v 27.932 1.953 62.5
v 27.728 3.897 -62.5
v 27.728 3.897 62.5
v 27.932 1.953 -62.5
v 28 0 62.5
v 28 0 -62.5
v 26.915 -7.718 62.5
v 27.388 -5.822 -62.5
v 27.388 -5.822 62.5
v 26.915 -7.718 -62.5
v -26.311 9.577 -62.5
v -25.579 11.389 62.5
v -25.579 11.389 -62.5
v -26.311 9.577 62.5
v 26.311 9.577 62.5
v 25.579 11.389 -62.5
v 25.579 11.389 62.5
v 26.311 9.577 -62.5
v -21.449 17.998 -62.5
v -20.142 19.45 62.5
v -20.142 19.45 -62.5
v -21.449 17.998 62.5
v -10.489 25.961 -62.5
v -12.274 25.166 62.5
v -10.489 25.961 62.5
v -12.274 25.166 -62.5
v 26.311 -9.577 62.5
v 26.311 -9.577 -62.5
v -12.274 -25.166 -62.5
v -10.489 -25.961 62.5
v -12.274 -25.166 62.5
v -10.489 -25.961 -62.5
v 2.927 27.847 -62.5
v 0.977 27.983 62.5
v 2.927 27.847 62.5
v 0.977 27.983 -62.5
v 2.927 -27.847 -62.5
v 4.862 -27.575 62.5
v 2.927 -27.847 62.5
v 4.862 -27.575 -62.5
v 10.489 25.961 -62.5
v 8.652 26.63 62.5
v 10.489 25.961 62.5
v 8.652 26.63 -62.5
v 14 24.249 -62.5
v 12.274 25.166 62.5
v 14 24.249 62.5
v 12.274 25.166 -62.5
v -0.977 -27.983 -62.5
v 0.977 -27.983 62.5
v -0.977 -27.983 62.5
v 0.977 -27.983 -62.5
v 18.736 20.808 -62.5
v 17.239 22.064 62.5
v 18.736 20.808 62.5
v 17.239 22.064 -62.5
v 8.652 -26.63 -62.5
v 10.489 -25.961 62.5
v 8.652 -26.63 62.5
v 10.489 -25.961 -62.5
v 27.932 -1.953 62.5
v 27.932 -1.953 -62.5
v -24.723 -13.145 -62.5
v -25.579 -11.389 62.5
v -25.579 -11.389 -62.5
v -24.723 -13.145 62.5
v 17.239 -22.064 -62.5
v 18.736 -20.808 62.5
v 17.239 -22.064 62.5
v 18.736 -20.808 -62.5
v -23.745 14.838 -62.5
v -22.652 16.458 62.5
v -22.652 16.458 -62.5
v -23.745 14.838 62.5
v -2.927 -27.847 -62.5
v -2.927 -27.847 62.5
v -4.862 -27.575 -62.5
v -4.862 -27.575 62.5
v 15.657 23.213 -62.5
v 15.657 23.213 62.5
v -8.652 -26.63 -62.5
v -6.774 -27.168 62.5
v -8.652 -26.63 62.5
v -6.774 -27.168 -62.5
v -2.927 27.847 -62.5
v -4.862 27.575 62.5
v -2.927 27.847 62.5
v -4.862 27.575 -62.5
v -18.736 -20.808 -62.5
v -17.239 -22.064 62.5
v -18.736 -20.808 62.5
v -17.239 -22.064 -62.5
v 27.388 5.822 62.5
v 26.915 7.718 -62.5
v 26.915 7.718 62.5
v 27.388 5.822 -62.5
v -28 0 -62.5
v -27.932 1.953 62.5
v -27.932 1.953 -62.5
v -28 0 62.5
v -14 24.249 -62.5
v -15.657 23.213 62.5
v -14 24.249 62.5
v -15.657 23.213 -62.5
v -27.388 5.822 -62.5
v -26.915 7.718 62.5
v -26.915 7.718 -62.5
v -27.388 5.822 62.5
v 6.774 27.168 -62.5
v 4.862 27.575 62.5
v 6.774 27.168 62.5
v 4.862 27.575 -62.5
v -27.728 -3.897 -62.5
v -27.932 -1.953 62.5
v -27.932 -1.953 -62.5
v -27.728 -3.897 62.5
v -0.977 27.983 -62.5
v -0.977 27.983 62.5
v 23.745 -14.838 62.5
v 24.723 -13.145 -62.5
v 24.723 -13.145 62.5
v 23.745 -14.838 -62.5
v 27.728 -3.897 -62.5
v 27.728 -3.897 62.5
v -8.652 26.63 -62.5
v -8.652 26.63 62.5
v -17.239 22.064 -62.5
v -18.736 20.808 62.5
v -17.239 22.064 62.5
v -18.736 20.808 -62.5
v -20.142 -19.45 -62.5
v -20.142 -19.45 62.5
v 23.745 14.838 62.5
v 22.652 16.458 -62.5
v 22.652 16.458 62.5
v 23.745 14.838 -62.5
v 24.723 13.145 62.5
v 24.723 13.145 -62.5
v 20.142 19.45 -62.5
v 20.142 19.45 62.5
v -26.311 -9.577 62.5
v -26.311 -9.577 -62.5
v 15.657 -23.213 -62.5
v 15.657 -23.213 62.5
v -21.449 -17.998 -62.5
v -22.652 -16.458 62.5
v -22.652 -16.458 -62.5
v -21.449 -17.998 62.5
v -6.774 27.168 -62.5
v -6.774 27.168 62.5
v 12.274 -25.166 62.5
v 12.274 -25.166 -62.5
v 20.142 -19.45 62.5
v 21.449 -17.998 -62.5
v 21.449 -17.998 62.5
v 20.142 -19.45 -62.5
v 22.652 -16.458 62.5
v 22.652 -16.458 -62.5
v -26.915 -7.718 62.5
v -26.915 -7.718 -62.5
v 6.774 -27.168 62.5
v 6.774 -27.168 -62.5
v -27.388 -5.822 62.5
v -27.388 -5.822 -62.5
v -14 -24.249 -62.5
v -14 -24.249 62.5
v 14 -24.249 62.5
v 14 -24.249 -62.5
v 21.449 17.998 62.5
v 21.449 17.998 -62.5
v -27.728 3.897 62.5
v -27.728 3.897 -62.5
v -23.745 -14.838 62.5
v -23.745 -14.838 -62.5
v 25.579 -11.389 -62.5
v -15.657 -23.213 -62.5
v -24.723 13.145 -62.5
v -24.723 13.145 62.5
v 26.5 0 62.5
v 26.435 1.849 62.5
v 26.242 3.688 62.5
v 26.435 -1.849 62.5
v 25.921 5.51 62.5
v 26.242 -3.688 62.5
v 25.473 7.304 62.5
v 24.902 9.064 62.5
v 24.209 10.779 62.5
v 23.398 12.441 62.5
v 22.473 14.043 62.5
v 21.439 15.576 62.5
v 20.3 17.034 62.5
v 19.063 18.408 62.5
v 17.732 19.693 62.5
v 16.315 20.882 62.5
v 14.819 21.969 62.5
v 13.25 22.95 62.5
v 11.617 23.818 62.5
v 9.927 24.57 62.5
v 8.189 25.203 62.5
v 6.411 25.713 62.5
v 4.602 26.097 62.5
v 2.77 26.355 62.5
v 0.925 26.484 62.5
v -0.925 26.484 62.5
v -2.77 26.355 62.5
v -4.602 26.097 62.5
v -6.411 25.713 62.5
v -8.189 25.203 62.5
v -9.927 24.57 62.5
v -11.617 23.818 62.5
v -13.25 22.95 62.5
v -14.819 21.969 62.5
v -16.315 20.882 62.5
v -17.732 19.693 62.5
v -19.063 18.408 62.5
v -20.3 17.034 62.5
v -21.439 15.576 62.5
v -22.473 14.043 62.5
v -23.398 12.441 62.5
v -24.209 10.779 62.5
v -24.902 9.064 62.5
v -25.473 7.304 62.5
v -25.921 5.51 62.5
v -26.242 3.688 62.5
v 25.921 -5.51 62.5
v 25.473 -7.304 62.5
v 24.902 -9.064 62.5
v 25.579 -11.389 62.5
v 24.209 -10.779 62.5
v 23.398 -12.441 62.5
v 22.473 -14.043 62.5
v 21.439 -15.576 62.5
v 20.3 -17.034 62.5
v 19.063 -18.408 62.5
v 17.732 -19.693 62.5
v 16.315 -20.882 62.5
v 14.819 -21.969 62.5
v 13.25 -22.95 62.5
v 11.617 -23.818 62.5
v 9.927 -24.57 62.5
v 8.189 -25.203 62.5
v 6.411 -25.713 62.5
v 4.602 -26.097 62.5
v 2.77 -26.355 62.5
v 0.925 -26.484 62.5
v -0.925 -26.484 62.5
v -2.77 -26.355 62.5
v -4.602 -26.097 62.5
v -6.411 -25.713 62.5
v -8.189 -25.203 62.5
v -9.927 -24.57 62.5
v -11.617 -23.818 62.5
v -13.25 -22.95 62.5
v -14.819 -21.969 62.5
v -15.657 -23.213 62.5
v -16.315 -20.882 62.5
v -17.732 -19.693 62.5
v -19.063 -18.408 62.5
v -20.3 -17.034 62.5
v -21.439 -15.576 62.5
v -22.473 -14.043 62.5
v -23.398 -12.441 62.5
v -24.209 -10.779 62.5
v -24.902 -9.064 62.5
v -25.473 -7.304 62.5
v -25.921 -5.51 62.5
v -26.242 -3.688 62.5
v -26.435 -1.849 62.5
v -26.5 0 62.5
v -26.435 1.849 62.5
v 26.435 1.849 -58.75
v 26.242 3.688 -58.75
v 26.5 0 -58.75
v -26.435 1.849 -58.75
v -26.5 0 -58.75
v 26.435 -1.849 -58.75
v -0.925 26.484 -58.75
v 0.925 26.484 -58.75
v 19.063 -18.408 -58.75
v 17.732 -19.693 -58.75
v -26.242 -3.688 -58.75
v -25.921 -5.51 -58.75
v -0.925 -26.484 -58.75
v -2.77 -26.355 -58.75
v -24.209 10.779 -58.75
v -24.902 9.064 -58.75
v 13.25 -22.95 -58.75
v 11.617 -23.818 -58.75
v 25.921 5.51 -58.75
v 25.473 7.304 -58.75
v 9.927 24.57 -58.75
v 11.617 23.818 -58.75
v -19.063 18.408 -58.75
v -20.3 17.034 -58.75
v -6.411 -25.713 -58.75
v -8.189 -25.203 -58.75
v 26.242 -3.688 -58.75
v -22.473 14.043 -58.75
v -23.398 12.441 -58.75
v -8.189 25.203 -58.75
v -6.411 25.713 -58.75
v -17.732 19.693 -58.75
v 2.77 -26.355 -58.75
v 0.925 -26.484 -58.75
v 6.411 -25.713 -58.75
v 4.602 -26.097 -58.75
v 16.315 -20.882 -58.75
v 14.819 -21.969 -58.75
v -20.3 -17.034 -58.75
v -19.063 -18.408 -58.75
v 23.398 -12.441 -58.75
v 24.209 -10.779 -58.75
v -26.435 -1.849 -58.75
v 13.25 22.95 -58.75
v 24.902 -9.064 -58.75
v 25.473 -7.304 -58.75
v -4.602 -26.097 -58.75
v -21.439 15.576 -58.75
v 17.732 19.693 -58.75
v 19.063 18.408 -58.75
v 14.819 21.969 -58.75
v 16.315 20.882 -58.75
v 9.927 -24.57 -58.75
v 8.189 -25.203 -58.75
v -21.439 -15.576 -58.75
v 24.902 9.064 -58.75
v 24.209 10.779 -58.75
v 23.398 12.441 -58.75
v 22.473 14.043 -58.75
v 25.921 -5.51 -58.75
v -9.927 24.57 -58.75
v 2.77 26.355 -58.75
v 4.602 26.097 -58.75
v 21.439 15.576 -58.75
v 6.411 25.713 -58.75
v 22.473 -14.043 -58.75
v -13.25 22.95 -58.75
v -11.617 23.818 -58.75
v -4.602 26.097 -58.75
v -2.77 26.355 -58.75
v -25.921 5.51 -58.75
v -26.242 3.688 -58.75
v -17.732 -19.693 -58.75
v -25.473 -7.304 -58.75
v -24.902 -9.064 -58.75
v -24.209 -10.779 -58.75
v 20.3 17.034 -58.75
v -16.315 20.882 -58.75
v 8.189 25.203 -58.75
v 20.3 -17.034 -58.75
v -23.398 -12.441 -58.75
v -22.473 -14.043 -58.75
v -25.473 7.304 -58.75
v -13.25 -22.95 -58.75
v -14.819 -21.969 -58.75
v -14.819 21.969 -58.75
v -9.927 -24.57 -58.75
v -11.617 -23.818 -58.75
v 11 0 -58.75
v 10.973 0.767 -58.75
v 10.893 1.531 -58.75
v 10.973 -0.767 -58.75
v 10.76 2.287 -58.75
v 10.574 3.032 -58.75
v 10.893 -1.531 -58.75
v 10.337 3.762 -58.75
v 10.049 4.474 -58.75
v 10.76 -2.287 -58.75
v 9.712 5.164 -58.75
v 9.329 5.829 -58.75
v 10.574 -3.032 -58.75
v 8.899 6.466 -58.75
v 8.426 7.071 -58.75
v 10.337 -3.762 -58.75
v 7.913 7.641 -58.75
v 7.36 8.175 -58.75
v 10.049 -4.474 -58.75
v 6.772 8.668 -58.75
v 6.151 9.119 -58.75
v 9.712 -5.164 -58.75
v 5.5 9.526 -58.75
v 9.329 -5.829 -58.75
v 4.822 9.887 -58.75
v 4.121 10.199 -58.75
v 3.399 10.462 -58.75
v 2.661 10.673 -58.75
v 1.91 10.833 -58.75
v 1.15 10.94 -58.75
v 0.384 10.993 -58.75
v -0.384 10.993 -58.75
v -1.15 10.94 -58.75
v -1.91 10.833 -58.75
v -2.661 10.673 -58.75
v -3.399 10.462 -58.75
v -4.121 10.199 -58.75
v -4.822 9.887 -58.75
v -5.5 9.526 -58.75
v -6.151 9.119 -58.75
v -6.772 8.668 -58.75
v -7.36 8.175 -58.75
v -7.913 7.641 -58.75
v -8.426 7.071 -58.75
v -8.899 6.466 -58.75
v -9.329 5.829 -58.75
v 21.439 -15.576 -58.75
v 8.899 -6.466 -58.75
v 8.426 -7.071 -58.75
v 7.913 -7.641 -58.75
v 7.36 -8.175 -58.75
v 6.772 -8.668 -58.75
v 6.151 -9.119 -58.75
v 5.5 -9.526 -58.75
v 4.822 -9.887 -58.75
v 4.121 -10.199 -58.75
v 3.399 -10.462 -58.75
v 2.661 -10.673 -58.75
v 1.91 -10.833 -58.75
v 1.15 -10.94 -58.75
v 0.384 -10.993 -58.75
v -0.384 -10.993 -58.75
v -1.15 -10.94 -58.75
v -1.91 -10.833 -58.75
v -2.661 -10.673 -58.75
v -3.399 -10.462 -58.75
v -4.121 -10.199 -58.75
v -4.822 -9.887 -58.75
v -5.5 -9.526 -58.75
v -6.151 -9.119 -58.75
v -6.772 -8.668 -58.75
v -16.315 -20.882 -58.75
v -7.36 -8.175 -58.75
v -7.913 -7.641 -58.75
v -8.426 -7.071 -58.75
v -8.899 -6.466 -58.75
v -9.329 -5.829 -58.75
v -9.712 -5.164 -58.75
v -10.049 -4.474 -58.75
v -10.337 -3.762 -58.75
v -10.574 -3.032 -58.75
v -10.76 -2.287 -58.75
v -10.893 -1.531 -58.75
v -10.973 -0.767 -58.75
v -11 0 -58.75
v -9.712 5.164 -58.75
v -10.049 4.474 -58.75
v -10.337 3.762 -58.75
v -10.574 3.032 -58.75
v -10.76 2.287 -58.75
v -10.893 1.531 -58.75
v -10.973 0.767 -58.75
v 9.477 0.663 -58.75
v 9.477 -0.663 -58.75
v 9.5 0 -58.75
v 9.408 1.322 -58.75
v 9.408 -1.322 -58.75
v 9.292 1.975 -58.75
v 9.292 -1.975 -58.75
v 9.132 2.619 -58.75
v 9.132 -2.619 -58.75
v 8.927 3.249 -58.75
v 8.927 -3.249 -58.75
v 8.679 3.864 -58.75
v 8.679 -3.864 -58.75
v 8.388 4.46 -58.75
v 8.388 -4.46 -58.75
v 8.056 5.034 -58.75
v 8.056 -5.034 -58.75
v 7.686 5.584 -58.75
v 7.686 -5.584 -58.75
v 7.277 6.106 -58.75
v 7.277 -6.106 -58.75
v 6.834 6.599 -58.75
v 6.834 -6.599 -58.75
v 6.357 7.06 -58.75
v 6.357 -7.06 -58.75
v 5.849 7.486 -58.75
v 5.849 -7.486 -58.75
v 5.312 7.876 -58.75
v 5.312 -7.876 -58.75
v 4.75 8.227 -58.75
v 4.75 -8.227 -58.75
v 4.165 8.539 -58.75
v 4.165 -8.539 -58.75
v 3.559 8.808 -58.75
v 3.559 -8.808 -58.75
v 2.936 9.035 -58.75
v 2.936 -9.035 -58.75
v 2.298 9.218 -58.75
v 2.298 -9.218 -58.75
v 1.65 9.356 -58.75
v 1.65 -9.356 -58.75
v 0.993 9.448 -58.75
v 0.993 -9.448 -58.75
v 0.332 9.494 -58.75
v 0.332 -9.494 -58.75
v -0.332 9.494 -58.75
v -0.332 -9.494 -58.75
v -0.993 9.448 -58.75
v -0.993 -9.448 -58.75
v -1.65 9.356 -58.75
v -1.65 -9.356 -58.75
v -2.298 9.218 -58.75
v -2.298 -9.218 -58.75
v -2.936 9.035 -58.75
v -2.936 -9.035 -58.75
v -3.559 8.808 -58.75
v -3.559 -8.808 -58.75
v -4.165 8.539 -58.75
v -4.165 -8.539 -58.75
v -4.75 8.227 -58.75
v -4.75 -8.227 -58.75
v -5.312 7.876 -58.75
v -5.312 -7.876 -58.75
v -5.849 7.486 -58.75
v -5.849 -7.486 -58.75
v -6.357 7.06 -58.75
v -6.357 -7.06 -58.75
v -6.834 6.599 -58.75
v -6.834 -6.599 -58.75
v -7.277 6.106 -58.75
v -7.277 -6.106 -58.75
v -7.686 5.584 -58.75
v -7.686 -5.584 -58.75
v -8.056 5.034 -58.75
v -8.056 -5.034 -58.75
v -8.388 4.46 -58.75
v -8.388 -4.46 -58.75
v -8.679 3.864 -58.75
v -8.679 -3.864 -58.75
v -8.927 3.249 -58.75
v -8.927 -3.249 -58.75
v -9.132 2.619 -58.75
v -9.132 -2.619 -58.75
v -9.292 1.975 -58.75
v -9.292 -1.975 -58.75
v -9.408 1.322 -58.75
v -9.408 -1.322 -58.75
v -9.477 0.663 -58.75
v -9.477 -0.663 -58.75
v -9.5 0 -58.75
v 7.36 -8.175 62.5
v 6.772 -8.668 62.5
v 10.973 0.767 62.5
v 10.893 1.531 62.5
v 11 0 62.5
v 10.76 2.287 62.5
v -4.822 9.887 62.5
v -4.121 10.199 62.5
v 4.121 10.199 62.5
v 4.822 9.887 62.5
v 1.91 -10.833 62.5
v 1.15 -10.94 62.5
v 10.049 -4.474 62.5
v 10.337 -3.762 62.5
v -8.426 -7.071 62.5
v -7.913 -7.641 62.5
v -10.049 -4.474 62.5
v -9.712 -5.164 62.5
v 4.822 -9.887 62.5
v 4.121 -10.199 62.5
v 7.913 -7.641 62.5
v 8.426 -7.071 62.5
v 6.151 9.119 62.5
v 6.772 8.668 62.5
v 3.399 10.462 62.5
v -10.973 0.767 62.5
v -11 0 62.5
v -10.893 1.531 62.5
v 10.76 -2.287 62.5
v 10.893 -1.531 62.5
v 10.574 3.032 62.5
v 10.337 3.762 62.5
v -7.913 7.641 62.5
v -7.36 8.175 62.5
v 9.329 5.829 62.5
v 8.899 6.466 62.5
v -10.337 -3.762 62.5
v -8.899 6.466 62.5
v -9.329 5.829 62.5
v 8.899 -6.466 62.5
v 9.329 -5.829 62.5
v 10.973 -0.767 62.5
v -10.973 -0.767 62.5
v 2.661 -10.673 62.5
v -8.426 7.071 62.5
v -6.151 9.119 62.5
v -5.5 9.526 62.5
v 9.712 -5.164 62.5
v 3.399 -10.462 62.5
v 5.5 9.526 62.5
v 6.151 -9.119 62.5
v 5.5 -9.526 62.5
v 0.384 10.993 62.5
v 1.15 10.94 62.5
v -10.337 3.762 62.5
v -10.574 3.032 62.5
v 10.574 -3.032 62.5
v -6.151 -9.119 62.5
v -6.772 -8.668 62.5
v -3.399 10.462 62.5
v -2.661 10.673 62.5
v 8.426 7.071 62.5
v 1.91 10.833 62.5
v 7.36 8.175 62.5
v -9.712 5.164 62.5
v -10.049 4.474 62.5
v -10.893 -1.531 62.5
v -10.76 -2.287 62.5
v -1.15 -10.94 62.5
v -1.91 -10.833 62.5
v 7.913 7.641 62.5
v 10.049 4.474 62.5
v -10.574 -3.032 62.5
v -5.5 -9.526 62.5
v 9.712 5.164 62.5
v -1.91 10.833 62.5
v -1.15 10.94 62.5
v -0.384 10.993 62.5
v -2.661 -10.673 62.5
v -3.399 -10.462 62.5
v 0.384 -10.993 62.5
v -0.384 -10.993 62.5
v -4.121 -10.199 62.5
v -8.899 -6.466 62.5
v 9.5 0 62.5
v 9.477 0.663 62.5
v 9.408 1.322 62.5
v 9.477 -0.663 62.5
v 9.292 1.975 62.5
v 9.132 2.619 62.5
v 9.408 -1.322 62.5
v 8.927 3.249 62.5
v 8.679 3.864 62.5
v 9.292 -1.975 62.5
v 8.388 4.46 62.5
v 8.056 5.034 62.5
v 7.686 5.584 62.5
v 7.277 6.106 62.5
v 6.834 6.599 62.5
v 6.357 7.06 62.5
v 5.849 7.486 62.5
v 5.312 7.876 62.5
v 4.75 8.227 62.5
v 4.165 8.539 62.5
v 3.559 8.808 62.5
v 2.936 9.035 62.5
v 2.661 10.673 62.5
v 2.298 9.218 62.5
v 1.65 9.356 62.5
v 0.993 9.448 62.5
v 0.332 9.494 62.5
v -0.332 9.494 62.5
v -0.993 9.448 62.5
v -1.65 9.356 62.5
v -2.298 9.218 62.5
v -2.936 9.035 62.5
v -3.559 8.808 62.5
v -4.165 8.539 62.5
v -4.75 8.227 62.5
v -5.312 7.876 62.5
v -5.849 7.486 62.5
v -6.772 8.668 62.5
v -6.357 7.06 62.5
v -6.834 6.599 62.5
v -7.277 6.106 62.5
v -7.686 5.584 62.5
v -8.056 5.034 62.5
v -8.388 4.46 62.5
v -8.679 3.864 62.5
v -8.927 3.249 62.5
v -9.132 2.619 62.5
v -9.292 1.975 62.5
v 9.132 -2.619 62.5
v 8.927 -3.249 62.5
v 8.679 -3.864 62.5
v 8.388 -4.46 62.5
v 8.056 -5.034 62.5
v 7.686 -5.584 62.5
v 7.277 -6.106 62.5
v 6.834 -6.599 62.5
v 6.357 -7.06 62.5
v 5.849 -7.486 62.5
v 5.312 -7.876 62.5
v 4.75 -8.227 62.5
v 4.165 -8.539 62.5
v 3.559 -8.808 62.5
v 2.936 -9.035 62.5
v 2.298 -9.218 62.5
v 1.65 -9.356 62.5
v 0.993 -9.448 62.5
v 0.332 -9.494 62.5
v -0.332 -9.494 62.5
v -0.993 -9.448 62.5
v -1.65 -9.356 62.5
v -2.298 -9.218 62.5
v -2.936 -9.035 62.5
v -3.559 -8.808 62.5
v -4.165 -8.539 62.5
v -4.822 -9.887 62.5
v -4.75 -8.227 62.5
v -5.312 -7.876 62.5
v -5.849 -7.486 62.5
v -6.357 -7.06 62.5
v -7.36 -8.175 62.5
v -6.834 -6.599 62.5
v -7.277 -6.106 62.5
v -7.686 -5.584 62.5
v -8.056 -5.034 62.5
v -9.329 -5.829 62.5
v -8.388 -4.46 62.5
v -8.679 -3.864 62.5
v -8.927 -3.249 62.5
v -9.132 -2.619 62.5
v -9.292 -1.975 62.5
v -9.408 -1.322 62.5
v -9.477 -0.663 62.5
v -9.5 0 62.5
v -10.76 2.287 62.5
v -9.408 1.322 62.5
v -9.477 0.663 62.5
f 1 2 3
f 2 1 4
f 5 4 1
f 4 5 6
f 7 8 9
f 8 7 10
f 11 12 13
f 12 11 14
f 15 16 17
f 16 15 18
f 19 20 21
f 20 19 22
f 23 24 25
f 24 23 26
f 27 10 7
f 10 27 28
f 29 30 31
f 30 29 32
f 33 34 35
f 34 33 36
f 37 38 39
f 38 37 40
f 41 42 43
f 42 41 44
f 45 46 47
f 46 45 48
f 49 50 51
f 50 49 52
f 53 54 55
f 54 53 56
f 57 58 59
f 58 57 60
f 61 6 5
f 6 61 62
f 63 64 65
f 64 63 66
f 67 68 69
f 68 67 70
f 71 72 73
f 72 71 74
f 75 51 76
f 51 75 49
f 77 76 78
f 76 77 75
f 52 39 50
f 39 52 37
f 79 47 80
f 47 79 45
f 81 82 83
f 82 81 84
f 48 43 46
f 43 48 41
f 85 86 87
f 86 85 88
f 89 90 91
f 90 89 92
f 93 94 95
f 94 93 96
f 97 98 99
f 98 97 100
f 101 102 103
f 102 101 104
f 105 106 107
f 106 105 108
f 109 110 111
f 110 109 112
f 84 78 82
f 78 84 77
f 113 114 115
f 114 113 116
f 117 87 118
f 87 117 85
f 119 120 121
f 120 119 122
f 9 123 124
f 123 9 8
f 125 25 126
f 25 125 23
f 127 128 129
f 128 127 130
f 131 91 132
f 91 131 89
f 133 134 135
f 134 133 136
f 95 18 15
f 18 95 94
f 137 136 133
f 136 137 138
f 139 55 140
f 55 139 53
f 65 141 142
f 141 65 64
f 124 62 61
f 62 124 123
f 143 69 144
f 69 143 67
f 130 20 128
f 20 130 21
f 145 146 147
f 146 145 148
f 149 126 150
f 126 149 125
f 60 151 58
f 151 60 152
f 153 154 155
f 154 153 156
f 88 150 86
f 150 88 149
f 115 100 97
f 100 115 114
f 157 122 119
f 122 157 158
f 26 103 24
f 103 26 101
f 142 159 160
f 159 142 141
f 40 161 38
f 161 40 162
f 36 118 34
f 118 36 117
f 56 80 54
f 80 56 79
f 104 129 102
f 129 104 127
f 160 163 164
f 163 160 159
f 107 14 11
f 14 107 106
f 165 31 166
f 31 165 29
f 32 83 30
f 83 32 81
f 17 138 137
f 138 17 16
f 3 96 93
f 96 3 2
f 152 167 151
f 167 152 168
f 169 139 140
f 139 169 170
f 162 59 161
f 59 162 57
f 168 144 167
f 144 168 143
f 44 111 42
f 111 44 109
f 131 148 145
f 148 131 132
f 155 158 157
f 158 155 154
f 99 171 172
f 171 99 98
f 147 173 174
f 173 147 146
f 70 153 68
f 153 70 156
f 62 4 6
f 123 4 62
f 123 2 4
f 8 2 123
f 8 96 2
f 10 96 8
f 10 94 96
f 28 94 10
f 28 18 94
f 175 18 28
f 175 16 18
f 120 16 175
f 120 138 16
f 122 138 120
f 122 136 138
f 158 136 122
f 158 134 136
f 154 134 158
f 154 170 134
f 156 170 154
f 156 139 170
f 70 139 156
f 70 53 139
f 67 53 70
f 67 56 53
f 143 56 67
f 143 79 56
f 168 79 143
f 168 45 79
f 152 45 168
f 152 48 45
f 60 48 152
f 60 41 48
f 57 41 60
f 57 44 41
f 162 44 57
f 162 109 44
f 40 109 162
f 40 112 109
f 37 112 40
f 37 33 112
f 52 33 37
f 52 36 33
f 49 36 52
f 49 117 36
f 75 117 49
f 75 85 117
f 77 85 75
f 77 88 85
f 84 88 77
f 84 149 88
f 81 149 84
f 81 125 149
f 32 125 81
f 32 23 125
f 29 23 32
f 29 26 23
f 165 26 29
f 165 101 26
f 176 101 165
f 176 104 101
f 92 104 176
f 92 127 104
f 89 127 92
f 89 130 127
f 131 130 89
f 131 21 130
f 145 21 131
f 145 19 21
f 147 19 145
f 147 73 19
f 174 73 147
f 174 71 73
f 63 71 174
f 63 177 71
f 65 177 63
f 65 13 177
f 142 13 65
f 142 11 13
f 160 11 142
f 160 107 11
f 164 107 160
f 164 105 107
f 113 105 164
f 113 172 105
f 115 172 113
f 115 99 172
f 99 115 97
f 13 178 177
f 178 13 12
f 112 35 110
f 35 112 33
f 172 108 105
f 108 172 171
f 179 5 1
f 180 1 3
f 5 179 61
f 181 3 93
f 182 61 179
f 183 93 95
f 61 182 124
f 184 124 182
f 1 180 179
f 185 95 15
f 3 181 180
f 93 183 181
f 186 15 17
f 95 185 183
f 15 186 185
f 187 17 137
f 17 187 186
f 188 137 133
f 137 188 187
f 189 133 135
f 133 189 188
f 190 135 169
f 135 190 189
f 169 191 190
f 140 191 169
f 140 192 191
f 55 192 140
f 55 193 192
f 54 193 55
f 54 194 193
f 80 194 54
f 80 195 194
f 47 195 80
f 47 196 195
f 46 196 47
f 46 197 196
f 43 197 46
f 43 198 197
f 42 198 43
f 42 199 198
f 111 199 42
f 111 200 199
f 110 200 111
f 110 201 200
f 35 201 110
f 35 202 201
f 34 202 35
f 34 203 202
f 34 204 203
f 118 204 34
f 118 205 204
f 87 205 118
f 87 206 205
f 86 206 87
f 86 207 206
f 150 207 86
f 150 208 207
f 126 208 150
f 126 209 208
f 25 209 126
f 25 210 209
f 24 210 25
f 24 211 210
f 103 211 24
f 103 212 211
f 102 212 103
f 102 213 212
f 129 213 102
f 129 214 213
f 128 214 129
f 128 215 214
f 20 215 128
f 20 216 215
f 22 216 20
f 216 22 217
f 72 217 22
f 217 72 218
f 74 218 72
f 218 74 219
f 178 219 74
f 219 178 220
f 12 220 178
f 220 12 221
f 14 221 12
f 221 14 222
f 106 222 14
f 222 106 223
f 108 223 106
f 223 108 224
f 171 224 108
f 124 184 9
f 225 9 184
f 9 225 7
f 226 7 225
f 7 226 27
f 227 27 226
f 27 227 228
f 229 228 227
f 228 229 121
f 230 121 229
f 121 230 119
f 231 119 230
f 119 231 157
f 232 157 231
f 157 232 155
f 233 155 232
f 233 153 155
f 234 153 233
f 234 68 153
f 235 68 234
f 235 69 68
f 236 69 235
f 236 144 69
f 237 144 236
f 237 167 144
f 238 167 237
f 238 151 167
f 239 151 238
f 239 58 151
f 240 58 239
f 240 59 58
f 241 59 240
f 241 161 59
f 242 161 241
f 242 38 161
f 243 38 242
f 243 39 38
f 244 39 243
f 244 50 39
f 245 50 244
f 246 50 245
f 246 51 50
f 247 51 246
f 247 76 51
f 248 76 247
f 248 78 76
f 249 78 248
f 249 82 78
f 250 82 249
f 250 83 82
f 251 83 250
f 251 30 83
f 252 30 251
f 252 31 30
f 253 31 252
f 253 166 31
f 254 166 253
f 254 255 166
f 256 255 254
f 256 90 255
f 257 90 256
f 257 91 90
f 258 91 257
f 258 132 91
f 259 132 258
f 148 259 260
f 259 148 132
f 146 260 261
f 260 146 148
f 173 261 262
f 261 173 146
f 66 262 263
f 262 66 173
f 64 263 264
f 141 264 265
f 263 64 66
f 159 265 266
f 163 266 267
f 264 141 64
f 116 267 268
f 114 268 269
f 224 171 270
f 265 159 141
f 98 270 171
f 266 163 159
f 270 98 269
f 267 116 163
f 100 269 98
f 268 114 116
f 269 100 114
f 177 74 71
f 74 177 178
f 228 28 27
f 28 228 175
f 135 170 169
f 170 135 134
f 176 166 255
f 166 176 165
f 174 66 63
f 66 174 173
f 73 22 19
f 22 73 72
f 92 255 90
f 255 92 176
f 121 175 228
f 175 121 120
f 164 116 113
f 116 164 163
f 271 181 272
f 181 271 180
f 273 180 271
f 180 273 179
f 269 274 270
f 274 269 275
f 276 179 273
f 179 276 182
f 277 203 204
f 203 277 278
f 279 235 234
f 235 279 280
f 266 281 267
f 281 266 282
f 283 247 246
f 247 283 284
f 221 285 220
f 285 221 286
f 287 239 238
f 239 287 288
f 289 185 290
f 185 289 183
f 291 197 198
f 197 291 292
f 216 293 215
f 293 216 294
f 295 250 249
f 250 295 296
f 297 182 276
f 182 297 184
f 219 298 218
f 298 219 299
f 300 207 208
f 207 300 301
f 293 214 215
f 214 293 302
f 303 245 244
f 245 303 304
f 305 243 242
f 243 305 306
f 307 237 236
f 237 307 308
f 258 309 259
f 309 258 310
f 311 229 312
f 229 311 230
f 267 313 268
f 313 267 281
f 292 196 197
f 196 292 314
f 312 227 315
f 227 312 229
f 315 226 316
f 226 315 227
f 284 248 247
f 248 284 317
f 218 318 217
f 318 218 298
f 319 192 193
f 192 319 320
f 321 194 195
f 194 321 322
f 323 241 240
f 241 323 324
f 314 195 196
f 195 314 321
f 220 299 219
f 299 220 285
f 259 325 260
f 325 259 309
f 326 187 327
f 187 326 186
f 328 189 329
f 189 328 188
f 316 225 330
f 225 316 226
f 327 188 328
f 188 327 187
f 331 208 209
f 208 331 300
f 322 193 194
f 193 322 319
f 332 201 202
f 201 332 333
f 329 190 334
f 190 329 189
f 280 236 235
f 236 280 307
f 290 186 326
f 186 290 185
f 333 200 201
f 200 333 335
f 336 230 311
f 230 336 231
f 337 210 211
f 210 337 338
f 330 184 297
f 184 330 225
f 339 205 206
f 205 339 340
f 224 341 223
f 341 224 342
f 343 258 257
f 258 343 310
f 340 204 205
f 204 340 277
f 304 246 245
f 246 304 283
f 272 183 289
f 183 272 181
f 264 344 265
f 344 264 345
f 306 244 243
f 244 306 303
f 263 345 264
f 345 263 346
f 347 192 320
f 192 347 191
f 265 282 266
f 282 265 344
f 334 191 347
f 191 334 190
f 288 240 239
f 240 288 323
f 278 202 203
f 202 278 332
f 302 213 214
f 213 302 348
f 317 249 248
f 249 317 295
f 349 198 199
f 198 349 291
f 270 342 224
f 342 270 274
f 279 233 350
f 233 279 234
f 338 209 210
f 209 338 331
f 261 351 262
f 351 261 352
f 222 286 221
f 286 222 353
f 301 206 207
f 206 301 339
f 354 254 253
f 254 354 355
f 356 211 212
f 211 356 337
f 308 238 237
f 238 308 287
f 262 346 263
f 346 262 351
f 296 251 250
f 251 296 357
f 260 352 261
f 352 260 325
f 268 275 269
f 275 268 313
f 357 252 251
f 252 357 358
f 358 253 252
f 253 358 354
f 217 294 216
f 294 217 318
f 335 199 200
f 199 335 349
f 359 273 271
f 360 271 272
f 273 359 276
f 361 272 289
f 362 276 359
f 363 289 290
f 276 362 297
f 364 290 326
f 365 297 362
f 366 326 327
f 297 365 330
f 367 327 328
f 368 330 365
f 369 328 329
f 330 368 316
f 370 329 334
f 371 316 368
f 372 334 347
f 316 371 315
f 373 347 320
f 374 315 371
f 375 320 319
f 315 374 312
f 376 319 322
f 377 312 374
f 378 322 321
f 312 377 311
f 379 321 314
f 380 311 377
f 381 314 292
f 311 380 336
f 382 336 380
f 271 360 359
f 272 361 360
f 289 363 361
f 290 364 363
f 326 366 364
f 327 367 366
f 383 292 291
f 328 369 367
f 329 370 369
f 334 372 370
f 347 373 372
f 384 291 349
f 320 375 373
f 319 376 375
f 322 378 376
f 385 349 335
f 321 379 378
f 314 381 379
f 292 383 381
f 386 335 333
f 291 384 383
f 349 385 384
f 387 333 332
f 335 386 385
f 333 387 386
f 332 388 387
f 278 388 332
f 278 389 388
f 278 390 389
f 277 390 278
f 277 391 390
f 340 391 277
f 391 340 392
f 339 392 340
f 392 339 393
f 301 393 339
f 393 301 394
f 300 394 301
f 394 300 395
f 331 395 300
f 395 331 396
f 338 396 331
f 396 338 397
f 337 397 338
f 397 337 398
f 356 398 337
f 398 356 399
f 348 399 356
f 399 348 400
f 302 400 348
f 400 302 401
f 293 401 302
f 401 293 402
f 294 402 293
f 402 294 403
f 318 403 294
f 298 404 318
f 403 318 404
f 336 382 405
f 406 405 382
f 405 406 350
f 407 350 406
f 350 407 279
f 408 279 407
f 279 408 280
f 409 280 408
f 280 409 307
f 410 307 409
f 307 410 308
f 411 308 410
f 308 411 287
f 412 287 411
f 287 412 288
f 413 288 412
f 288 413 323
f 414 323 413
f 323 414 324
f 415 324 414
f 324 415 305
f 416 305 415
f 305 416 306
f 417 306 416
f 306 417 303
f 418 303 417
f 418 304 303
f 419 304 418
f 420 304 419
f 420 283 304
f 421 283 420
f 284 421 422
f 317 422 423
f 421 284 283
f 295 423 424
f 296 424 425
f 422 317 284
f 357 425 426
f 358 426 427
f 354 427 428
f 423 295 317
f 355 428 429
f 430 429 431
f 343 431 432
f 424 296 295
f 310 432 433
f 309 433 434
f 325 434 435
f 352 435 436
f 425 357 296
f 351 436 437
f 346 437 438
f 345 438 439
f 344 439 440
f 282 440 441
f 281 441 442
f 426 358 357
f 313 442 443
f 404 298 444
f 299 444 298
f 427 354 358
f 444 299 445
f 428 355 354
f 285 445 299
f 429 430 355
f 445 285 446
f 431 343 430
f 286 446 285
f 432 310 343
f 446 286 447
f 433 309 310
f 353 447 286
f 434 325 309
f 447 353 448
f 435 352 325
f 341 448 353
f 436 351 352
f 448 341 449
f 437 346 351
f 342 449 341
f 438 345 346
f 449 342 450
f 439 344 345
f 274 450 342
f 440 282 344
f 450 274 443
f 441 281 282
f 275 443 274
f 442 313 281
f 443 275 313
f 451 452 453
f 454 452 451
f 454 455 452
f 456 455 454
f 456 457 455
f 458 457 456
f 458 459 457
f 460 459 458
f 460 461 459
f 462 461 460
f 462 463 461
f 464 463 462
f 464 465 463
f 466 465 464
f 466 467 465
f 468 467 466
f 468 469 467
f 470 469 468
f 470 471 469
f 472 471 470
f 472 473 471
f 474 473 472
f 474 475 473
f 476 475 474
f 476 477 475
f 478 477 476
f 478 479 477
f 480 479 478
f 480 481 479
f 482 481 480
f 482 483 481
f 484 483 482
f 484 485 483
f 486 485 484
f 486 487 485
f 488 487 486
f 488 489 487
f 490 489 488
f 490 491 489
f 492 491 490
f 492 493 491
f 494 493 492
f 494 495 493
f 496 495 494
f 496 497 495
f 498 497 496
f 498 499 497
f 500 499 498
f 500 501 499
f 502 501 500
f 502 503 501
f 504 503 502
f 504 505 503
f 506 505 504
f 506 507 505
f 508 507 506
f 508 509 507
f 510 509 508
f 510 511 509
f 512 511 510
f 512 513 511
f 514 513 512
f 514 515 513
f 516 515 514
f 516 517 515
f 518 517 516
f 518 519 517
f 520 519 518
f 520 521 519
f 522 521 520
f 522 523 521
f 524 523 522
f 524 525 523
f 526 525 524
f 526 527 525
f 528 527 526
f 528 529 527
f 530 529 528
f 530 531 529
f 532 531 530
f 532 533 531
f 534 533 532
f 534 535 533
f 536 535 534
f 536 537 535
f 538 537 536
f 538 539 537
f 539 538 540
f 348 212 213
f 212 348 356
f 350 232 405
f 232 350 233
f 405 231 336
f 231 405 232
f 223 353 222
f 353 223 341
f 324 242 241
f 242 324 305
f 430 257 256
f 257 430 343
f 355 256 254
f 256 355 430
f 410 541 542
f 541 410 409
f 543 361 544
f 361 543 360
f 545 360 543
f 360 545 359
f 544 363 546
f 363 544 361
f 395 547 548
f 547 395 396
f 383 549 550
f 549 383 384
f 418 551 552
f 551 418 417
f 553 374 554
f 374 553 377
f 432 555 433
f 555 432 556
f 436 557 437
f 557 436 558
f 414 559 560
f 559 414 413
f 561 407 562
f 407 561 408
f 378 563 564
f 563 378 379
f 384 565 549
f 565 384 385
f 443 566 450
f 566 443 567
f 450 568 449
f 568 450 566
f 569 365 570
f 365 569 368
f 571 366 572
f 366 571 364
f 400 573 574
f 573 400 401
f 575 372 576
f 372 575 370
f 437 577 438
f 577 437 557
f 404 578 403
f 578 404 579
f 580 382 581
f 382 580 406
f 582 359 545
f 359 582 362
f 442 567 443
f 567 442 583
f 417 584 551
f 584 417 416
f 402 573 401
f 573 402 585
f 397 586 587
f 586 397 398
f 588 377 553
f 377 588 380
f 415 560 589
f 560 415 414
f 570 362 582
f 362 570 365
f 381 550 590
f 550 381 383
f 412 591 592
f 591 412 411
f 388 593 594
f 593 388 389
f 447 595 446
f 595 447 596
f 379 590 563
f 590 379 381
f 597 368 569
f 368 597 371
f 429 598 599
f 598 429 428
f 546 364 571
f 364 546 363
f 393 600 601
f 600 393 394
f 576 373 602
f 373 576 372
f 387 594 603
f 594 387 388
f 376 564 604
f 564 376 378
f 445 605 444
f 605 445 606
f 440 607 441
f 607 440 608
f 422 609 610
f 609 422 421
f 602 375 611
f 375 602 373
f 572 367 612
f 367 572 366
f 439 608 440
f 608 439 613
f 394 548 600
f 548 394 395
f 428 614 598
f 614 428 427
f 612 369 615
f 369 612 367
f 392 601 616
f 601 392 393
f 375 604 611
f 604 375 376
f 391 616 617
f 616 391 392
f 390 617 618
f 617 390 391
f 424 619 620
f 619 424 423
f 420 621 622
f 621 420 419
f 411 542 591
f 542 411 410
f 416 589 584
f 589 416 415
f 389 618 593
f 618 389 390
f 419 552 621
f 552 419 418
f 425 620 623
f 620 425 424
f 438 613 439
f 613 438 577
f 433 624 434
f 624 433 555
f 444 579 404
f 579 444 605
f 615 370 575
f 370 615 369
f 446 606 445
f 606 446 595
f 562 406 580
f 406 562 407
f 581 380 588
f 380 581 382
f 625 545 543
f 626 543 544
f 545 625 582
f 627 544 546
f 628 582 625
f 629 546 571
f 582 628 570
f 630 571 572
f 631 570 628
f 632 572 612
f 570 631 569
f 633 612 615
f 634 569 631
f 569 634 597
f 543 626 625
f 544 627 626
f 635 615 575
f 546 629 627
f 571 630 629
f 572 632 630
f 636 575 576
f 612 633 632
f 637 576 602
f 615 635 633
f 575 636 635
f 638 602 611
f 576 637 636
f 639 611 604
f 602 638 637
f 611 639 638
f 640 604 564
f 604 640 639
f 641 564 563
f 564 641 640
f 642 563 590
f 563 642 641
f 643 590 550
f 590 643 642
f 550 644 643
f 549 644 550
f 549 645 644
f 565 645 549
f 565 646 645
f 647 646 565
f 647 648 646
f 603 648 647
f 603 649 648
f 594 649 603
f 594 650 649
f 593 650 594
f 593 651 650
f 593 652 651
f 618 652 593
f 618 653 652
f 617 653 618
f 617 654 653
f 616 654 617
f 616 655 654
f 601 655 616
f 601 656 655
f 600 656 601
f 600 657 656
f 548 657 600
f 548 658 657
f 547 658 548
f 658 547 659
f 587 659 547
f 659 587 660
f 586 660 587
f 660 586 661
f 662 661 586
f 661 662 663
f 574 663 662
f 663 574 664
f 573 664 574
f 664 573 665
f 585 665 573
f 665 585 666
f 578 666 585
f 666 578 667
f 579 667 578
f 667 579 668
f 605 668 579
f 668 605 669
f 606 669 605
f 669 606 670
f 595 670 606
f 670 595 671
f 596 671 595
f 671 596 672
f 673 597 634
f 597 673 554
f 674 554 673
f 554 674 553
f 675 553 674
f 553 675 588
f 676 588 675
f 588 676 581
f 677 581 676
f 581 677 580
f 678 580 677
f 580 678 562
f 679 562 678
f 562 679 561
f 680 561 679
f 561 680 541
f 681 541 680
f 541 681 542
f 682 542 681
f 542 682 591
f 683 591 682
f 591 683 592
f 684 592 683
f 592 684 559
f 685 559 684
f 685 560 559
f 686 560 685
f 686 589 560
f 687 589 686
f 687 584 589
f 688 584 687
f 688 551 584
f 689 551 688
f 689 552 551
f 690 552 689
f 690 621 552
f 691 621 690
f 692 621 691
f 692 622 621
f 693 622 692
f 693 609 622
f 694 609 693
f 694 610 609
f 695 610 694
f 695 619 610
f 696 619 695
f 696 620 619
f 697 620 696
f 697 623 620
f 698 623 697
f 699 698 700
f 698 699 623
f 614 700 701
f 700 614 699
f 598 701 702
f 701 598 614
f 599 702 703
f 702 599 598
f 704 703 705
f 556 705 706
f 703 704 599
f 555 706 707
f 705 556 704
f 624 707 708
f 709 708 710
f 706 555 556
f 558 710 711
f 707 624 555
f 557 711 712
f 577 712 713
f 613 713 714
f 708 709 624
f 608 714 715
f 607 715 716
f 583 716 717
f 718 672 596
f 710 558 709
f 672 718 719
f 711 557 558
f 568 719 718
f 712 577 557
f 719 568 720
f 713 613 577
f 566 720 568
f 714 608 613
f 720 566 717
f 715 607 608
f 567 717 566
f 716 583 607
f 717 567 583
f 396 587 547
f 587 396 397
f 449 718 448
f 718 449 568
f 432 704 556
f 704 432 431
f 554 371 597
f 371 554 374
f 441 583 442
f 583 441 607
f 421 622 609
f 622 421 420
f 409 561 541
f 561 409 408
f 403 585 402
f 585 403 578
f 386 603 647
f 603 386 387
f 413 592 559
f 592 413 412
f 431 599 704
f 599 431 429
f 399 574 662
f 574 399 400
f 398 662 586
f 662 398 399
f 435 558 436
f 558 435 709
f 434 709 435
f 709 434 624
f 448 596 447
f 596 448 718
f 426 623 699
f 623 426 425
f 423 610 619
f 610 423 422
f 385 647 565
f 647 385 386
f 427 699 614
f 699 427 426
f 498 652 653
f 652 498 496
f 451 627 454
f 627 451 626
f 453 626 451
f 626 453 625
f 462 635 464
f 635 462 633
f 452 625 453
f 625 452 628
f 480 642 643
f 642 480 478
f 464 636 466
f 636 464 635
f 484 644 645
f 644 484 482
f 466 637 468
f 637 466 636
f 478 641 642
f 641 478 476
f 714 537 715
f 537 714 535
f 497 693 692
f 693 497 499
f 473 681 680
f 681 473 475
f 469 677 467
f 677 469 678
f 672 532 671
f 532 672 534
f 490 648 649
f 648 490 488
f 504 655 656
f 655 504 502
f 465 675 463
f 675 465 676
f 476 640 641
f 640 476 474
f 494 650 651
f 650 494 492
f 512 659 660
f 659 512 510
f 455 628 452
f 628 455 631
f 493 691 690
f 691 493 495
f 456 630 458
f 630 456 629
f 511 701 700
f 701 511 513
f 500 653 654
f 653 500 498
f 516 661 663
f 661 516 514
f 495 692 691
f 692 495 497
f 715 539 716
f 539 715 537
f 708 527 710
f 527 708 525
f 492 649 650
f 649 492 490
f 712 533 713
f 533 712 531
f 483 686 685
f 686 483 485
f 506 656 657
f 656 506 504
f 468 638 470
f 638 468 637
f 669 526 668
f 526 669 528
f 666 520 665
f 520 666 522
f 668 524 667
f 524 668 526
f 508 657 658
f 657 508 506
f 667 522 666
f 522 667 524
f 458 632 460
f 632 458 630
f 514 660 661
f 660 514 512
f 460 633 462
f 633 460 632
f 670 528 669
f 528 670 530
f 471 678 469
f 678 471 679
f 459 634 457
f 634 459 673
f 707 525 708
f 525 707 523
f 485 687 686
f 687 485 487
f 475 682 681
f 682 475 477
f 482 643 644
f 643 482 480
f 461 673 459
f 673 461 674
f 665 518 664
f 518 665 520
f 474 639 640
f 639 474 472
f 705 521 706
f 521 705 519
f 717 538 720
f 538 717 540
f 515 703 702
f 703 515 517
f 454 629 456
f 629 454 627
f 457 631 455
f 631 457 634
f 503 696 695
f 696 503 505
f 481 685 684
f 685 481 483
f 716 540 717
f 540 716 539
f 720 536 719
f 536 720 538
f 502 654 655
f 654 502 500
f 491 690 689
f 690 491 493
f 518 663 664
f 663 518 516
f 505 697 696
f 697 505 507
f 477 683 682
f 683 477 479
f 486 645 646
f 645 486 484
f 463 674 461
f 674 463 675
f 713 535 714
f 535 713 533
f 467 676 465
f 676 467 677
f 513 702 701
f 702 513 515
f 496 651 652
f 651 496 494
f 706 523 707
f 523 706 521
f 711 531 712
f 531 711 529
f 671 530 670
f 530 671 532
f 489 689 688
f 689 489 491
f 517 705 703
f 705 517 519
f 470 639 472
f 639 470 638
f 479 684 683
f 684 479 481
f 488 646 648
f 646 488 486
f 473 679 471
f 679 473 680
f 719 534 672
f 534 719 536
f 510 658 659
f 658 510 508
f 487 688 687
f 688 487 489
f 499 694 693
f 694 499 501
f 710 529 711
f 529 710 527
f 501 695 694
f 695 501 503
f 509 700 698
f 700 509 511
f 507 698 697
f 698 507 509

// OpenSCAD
// file: ../_lib_/cap3d.scad
module cap3d(outer_radius=20, height=10, walls_thickness=2, top_thickness=-1){
    /* module for round lid cap*/
    top_thickness = top_thickness <0 ? walls_thickness : top_thickness;
    r_outer = outer_radius;
    h_outer = height;
    r_inner = outer_radius - walls_thickness;
    h_inner = height - top_thickness;
    inner_z_offset = top_thickness;
    
    difference(){
        color("blue")cylinder(h=h_outer ,r=r_outer ,center=true); //outer
        translate([0,0,top_thickness]) color("red")cylinder(h=h_inner ,r=r_inner ,center=true); //inner
        }//difference
    } //module
    
  $fn=90;
//  cap3d(top_thickness=0);
// file: ../_lib_/straight_pipe3d.scad
module straight_pipe3d(r_inner=4, r_outer=6, length=10){

        difference(){
            color("blue")cylinder(h=length ,r=r_outer ,center=true); //outer
            color("red") cylinder(h=length ,r=r_inner ,center=true); //inner
        }//difference

    }//module
    
/*
$fn=60;
translate([0,0,-3]) straight_pipe3d();
translate([0,3,0]) rotate([90,0,0]) straight_pipe3d();
    */
// main file
include <../_lib_/straight_pipe3d.scad>
include <../_lib_/cap3d.scad>


cap3d(outer_radius=28, height=125, walls_thickness=1.5, top_thickness=2.5);
straight_pipe3d(r_inner=9.5, r_outer=11, length=125);


//cap3d(outer_radius=29.0, height=8, walls_thickness=0.8, top_thickness=1.0);
//straight_pipe3d(r_inner=8.5, r_outer=9, length=10);
